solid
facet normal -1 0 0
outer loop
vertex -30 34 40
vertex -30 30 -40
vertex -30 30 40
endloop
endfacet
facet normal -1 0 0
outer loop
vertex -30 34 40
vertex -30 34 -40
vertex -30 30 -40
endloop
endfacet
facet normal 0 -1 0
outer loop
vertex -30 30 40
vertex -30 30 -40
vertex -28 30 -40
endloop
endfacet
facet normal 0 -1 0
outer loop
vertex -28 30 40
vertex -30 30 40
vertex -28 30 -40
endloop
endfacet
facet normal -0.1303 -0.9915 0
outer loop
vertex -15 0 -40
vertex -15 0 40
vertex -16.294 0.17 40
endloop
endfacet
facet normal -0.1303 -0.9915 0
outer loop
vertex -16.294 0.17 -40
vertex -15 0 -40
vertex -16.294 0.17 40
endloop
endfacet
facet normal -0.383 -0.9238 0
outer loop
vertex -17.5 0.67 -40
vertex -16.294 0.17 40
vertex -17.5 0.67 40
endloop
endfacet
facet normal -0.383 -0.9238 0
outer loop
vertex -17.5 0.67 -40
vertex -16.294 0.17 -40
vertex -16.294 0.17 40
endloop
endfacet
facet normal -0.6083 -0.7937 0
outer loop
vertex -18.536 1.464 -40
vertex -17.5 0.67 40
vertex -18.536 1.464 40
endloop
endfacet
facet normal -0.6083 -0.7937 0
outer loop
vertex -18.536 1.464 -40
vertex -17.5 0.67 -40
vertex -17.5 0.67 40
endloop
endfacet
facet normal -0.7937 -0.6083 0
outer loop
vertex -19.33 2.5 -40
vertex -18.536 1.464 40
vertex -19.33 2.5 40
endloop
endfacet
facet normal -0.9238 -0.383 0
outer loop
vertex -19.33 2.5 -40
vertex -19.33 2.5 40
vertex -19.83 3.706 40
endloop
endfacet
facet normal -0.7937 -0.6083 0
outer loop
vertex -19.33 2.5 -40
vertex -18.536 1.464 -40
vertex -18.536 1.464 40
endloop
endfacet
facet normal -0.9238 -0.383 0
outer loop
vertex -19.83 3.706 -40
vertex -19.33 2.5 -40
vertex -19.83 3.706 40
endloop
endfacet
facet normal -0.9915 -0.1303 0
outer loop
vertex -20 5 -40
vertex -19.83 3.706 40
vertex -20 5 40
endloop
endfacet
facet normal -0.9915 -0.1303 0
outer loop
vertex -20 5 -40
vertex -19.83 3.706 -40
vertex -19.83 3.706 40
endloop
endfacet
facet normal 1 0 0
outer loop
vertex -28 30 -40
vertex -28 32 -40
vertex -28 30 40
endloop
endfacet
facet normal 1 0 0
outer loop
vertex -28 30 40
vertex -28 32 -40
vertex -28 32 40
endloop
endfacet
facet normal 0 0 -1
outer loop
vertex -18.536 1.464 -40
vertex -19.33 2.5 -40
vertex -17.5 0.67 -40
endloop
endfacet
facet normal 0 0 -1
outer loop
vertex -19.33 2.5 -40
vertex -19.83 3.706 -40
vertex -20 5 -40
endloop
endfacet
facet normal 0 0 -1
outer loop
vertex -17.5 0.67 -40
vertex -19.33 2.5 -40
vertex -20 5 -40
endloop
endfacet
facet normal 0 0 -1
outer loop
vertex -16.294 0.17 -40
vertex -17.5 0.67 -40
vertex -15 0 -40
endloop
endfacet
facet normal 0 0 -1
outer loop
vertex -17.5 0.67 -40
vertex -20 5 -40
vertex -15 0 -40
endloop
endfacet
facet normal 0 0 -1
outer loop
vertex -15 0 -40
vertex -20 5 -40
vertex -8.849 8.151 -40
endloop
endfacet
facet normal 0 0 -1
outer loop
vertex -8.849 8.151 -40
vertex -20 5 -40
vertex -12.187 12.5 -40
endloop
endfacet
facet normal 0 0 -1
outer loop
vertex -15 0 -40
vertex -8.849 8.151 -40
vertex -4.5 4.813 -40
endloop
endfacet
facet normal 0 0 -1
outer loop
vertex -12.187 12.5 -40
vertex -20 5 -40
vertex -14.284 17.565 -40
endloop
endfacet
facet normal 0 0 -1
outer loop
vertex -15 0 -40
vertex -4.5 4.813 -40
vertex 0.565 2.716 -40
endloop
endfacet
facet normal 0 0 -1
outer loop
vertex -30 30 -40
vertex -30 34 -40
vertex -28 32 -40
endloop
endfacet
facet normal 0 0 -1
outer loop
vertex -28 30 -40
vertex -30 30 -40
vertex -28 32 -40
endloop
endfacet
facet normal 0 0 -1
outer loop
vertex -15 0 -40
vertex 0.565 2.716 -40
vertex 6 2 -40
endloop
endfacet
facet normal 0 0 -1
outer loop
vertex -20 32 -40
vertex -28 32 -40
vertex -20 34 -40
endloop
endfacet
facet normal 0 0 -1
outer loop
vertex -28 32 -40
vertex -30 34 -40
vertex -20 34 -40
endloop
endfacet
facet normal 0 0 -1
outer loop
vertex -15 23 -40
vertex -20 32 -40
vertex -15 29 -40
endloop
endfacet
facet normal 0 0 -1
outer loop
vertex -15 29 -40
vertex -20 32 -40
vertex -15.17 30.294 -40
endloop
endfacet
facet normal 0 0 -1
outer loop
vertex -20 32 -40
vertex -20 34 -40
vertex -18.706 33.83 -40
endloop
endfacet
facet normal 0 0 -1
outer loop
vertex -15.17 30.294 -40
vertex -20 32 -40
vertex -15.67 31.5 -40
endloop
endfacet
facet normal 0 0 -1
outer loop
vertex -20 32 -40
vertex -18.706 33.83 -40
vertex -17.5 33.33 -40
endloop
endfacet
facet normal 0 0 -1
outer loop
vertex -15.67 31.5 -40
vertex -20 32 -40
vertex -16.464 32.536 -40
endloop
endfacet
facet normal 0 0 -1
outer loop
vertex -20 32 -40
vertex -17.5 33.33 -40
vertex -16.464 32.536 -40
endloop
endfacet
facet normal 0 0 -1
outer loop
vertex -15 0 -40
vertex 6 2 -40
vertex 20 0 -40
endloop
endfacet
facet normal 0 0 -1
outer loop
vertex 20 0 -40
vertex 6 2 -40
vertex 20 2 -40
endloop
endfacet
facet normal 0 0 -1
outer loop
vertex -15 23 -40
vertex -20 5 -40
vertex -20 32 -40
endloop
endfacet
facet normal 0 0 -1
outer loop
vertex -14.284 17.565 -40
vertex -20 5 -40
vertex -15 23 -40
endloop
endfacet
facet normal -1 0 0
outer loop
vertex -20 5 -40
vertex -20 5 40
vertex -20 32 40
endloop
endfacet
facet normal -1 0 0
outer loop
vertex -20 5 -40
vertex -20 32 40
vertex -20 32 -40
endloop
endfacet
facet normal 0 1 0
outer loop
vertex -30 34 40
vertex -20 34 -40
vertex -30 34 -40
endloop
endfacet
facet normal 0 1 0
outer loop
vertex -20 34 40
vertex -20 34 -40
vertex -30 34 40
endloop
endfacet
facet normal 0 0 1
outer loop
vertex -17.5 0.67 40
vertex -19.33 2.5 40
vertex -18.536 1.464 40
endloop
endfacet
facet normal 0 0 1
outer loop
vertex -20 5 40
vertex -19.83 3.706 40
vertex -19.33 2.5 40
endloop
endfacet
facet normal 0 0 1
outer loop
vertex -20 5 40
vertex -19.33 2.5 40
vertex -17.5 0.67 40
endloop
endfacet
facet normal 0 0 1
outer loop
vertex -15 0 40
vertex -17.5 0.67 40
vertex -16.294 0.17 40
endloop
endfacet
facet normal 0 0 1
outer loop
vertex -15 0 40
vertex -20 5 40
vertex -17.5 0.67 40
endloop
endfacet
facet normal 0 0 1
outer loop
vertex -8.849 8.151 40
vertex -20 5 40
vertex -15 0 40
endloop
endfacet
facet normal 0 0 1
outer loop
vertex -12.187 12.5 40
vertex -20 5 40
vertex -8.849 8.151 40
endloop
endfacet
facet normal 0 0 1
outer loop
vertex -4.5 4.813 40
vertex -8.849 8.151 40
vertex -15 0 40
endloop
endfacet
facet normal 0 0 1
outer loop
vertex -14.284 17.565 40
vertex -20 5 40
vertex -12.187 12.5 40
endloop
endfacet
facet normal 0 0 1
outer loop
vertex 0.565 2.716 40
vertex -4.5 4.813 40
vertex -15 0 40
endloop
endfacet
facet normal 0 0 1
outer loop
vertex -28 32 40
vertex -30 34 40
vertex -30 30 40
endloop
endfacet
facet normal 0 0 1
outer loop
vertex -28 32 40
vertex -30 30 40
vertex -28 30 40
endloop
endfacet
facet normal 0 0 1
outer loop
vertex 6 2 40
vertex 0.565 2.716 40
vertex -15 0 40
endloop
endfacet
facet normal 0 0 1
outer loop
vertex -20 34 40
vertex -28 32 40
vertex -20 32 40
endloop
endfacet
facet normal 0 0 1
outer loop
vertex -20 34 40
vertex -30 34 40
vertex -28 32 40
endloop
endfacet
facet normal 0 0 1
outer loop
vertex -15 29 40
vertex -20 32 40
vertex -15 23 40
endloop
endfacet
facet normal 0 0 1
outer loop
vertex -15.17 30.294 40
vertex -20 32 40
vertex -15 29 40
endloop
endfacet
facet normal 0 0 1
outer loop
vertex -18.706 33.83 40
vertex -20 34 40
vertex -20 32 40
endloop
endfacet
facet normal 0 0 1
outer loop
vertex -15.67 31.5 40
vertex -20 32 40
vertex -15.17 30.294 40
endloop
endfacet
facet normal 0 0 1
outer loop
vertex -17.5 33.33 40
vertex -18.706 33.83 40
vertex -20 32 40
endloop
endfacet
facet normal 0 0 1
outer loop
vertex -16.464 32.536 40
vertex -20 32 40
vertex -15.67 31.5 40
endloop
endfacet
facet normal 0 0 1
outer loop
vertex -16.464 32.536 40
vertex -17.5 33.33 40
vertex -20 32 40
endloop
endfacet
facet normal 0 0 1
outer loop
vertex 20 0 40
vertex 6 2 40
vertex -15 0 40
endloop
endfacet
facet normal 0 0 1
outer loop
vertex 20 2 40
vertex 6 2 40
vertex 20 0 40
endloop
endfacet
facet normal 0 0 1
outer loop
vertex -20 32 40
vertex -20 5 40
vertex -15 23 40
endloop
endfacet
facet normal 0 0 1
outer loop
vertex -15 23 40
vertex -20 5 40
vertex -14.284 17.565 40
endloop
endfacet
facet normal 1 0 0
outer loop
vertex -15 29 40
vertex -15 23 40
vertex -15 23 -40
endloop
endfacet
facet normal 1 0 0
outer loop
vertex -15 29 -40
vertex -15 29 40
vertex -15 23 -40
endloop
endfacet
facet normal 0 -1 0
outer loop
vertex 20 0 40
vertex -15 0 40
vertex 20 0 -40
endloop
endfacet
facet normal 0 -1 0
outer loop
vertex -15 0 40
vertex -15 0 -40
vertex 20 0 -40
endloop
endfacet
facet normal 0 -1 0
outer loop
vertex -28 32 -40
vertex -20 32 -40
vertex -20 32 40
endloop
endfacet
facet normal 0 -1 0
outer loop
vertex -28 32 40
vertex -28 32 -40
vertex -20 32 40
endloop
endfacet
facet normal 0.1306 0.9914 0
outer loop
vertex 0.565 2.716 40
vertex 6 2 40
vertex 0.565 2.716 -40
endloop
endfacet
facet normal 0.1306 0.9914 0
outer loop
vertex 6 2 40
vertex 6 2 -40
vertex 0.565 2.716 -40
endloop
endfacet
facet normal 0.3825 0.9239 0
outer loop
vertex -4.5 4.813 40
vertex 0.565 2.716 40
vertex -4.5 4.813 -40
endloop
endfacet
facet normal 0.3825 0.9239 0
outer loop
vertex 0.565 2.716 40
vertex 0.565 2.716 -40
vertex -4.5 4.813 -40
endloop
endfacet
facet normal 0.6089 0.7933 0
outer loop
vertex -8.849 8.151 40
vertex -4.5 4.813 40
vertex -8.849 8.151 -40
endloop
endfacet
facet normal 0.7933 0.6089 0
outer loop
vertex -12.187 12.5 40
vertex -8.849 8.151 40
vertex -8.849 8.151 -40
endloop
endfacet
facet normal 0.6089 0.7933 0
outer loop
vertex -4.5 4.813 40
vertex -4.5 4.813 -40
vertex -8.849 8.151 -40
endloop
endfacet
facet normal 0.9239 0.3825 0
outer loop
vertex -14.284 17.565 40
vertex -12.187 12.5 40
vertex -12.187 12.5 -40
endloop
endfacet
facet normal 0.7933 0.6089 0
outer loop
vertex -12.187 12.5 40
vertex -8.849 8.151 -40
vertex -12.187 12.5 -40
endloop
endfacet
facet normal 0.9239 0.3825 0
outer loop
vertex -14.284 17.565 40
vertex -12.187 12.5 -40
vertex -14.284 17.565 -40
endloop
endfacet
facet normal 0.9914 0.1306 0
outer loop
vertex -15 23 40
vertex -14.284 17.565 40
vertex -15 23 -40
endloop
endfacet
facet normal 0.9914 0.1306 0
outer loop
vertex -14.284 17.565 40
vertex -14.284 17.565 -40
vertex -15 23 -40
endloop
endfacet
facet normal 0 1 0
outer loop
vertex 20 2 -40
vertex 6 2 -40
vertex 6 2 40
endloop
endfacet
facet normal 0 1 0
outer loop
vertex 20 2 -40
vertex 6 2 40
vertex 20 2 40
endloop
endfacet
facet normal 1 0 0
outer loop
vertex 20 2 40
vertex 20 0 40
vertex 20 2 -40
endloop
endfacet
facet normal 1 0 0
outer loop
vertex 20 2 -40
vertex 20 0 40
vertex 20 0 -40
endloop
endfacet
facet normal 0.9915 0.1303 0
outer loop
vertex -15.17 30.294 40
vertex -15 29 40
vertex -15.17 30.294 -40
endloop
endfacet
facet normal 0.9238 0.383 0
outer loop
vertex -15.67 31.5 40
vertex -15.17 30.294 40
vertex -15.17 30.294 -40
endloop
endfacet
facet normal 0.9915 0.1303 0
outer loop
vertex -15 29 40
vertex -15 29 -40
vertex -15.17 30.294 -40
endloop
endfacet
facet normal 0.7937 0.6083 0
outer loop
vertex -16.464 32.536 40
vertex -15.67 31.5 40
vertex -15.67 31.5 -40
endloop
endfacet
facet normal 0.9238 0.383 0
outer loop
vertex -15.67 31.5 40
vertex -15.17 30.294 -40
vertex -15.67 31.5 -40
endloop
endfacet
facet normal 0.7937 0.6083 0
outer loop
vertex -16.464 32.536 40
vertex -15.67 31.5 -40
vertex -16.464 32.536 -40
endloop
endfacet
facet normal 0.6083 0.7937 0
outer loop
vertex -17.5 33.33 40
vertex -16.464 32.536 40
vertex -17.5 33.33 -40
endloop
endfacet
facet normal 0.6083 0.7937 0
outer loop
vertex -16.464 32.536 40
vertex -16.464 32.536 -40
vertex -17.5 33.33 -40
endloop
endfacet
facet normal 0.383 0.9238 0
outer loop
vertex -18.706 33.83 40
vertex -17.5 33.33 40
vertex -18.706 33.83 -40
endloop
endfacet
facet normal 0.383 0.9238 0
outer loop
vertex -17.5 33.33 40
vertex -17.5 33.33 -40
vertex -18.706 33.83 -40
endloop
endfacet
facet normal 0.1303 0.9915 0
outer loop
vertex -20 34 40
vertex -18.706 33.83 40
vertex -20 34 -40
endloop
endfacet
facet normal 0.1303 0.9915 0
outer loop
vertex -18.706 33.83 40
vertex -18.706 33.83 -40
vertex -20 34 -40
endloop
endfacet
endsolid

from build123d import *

# Parameters (mm, degrees)
SKETCH1_W           = 40
SKETCH1_H           = 80
BOSS_EXTRUDE4_DEPTH = 2
SKETCH4_W           = 5
SKETCH4_H           = 80
BOSS_EXTRUDE5_DEPTH = 32
FILLET3_R           = 21
SKETCH5_W           = 80
SKETCH5_H           = 2
BOSS_EXTRUDE6_DEPTH = 10
SKETCH6_W           = 2
SKETCH6_H           = 80
BOSS_EXTRUDE7_DEPTH = 2
FILLET4_R           = 5


with BuildPart() as part:
    # Sketch1 → Boss-Extrude4 (new body)
    with BuildSketch(Plane(origin=(0, 0, 0), x_dir=(1, 0, 0), z_dir=(0, 1, 0))):
        Rectangle(SKETCH1_W, SKETCH1_H)
    extrude(amount=BOSS_EXTRUDE4_DEPTH)

    # Sketch4 → Boss-Extrude5 (add)
    with BuildSketch(Plane(origin=(0, 2, 0), x_dir=(1, 0, 0), z_dir=(0, 1, 0))):
        with Locations((-17.5, 0)):
            Rectangle(SKETCH4_W, SKETCH4_H)
    extrude(amount=BOSS_EXTRUDE5_DEPTH)

    # Fillet3
    fillet3_edges = [part.edges().sort_by_distance(p)[0] for p in [
        (-15, 2, 0),
    ]]
    fillet(fillet3_edges, radius=FILLET3_R)

    # Sketch5 → Boss-Extrude6 (add)
    with BuildSketch(Plane.ZY.offset(20)):
        with Locations((0, 33)):
            Rectangle(SKETCH5_W, SKETCH5_H)
    extrude(amount=BOSS_EXTRUDE6_DEPTH)

    # Sketch6 → Boss-Extrude7 (add)
    with BuildSketch(Plane.XZ.offset(-32)):
        with Locations((-29, 0)):
            Rectangle(SKETCH6_W, SKETCH6_H)
    extrude(amount=BOSS_EXTRUDE7_DEPTH)

    # Fillet4
    fillet4_edges = [part.edges().sort_by_distance(p)[0] for p in [
        (-15, 34, 0),
        (-20, 0, 0),
    ]]
    fillet(fillet4_edges, radius=FILLET4_R)


solid = part.part
